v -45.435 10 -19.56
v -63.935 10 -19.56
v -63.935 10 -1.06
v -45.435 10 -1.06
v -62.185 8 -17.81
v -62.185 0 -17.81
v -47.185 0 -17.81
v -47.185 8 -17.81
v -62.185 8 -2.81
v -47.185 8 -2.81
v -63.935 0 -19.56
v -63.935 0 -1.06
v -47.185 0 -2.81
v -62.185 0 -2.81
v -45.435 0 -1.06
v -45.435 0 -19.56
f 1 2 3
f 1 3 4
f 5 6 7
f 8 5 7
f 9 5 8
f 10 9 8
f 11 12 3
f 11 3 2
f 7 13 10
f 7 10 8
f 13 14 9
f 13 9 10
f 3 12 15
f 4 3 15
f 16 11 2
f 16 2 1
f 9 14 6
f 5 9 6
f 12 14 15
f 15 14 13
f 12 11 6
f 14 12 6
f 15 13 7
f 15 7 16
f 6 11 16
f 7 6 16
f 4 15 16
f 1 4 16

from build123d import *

# Parameters (mm, degrees)
SKETCH_1_W               = 18.5
SKETCH_1_H               = 18.5
EXTRUDE_2_DEPTH          = 10
CUT_EXTRUDE_1_DEPTH      = 8
CUT_EXTRUDE_1_DEPTH_BACK = 10
SKETCH_1_5_W             = 15
SKETCH_1_5_H             = 15
SKETCH_1_8_R             = 3
EXTRUDE_3_DEPTH          = 8


with BuildPart() as part:
    # 草图1 → 凸台-拉伸2 (new body)
    with BuildSketch(Plane(origin=(-54.452348576, 0, -10.111307481), x_dir=(1, 0, 0), z_dir=(0, 1, 0))):
        with Locations((-0.232982833, 0.198747616)):
            Rectangle(SKETCH_1_W, SKETCH_1_H)
    extrude(amount=EXTRUDE_2_DEPTH)

    # 草图1<5> → 切除-拉伸1 (cut, two sides: drawn at the far end of the back side and taken through both)
    with BuildSketch(Plane(origin=(-54.452348576, 0, -10.111307481), x_dir=(1, 0, 0), z_dir=(0, 1, 0)).offset(-CUT_EXTRUDE_1_DEPTH_BACK)):
        with Locations((-0.232977593, 0.198745421)):
            Rectangle(SKETCH_1_5_W, SKETCH_1_5_H)
    extrude(amount=CUT_EXTRUDE_1_DEPTH + CUT_EXTRUDE_1_DEPTH_BACK, mode=Mode.SUBTRACT)


with BuildPart() as body_2:
    # 草图1<8> → 凸台-拉伸3 (new body)
    with BuildSketch(Plane(origin=(-54.452348576, 0, -10.111307481), x_dir=(1, 0, 0), z_dir=(0, 1, 0))):
        with Locations(Location((-32.631590837, 12.584276694, 0), (0, 0, 270))):
            Circle(SKETCH_1_8_R)
        Polygon((-34.631589769, 12.124234893), (-34.631589769, 13.124234893), (-33.131574719, 13.124234893), (-33.131574719, 14.5842993), (-32.131574719, 14.5842993), (-32.131574719, 13.124234893), (-30.631589769, 13.124234893), (-30.631589769, 12.124234893), (-32.131574719, 12.124234893), (-32.131574719, 10.5842993), (-33.131574719, 10.5842993), (-33.131574719, 12.124234893), align=None, mode=Mode.SUBTRACT)
    extrude(amount=EXTRUDE_3_DEPTH)


solid = part.part
